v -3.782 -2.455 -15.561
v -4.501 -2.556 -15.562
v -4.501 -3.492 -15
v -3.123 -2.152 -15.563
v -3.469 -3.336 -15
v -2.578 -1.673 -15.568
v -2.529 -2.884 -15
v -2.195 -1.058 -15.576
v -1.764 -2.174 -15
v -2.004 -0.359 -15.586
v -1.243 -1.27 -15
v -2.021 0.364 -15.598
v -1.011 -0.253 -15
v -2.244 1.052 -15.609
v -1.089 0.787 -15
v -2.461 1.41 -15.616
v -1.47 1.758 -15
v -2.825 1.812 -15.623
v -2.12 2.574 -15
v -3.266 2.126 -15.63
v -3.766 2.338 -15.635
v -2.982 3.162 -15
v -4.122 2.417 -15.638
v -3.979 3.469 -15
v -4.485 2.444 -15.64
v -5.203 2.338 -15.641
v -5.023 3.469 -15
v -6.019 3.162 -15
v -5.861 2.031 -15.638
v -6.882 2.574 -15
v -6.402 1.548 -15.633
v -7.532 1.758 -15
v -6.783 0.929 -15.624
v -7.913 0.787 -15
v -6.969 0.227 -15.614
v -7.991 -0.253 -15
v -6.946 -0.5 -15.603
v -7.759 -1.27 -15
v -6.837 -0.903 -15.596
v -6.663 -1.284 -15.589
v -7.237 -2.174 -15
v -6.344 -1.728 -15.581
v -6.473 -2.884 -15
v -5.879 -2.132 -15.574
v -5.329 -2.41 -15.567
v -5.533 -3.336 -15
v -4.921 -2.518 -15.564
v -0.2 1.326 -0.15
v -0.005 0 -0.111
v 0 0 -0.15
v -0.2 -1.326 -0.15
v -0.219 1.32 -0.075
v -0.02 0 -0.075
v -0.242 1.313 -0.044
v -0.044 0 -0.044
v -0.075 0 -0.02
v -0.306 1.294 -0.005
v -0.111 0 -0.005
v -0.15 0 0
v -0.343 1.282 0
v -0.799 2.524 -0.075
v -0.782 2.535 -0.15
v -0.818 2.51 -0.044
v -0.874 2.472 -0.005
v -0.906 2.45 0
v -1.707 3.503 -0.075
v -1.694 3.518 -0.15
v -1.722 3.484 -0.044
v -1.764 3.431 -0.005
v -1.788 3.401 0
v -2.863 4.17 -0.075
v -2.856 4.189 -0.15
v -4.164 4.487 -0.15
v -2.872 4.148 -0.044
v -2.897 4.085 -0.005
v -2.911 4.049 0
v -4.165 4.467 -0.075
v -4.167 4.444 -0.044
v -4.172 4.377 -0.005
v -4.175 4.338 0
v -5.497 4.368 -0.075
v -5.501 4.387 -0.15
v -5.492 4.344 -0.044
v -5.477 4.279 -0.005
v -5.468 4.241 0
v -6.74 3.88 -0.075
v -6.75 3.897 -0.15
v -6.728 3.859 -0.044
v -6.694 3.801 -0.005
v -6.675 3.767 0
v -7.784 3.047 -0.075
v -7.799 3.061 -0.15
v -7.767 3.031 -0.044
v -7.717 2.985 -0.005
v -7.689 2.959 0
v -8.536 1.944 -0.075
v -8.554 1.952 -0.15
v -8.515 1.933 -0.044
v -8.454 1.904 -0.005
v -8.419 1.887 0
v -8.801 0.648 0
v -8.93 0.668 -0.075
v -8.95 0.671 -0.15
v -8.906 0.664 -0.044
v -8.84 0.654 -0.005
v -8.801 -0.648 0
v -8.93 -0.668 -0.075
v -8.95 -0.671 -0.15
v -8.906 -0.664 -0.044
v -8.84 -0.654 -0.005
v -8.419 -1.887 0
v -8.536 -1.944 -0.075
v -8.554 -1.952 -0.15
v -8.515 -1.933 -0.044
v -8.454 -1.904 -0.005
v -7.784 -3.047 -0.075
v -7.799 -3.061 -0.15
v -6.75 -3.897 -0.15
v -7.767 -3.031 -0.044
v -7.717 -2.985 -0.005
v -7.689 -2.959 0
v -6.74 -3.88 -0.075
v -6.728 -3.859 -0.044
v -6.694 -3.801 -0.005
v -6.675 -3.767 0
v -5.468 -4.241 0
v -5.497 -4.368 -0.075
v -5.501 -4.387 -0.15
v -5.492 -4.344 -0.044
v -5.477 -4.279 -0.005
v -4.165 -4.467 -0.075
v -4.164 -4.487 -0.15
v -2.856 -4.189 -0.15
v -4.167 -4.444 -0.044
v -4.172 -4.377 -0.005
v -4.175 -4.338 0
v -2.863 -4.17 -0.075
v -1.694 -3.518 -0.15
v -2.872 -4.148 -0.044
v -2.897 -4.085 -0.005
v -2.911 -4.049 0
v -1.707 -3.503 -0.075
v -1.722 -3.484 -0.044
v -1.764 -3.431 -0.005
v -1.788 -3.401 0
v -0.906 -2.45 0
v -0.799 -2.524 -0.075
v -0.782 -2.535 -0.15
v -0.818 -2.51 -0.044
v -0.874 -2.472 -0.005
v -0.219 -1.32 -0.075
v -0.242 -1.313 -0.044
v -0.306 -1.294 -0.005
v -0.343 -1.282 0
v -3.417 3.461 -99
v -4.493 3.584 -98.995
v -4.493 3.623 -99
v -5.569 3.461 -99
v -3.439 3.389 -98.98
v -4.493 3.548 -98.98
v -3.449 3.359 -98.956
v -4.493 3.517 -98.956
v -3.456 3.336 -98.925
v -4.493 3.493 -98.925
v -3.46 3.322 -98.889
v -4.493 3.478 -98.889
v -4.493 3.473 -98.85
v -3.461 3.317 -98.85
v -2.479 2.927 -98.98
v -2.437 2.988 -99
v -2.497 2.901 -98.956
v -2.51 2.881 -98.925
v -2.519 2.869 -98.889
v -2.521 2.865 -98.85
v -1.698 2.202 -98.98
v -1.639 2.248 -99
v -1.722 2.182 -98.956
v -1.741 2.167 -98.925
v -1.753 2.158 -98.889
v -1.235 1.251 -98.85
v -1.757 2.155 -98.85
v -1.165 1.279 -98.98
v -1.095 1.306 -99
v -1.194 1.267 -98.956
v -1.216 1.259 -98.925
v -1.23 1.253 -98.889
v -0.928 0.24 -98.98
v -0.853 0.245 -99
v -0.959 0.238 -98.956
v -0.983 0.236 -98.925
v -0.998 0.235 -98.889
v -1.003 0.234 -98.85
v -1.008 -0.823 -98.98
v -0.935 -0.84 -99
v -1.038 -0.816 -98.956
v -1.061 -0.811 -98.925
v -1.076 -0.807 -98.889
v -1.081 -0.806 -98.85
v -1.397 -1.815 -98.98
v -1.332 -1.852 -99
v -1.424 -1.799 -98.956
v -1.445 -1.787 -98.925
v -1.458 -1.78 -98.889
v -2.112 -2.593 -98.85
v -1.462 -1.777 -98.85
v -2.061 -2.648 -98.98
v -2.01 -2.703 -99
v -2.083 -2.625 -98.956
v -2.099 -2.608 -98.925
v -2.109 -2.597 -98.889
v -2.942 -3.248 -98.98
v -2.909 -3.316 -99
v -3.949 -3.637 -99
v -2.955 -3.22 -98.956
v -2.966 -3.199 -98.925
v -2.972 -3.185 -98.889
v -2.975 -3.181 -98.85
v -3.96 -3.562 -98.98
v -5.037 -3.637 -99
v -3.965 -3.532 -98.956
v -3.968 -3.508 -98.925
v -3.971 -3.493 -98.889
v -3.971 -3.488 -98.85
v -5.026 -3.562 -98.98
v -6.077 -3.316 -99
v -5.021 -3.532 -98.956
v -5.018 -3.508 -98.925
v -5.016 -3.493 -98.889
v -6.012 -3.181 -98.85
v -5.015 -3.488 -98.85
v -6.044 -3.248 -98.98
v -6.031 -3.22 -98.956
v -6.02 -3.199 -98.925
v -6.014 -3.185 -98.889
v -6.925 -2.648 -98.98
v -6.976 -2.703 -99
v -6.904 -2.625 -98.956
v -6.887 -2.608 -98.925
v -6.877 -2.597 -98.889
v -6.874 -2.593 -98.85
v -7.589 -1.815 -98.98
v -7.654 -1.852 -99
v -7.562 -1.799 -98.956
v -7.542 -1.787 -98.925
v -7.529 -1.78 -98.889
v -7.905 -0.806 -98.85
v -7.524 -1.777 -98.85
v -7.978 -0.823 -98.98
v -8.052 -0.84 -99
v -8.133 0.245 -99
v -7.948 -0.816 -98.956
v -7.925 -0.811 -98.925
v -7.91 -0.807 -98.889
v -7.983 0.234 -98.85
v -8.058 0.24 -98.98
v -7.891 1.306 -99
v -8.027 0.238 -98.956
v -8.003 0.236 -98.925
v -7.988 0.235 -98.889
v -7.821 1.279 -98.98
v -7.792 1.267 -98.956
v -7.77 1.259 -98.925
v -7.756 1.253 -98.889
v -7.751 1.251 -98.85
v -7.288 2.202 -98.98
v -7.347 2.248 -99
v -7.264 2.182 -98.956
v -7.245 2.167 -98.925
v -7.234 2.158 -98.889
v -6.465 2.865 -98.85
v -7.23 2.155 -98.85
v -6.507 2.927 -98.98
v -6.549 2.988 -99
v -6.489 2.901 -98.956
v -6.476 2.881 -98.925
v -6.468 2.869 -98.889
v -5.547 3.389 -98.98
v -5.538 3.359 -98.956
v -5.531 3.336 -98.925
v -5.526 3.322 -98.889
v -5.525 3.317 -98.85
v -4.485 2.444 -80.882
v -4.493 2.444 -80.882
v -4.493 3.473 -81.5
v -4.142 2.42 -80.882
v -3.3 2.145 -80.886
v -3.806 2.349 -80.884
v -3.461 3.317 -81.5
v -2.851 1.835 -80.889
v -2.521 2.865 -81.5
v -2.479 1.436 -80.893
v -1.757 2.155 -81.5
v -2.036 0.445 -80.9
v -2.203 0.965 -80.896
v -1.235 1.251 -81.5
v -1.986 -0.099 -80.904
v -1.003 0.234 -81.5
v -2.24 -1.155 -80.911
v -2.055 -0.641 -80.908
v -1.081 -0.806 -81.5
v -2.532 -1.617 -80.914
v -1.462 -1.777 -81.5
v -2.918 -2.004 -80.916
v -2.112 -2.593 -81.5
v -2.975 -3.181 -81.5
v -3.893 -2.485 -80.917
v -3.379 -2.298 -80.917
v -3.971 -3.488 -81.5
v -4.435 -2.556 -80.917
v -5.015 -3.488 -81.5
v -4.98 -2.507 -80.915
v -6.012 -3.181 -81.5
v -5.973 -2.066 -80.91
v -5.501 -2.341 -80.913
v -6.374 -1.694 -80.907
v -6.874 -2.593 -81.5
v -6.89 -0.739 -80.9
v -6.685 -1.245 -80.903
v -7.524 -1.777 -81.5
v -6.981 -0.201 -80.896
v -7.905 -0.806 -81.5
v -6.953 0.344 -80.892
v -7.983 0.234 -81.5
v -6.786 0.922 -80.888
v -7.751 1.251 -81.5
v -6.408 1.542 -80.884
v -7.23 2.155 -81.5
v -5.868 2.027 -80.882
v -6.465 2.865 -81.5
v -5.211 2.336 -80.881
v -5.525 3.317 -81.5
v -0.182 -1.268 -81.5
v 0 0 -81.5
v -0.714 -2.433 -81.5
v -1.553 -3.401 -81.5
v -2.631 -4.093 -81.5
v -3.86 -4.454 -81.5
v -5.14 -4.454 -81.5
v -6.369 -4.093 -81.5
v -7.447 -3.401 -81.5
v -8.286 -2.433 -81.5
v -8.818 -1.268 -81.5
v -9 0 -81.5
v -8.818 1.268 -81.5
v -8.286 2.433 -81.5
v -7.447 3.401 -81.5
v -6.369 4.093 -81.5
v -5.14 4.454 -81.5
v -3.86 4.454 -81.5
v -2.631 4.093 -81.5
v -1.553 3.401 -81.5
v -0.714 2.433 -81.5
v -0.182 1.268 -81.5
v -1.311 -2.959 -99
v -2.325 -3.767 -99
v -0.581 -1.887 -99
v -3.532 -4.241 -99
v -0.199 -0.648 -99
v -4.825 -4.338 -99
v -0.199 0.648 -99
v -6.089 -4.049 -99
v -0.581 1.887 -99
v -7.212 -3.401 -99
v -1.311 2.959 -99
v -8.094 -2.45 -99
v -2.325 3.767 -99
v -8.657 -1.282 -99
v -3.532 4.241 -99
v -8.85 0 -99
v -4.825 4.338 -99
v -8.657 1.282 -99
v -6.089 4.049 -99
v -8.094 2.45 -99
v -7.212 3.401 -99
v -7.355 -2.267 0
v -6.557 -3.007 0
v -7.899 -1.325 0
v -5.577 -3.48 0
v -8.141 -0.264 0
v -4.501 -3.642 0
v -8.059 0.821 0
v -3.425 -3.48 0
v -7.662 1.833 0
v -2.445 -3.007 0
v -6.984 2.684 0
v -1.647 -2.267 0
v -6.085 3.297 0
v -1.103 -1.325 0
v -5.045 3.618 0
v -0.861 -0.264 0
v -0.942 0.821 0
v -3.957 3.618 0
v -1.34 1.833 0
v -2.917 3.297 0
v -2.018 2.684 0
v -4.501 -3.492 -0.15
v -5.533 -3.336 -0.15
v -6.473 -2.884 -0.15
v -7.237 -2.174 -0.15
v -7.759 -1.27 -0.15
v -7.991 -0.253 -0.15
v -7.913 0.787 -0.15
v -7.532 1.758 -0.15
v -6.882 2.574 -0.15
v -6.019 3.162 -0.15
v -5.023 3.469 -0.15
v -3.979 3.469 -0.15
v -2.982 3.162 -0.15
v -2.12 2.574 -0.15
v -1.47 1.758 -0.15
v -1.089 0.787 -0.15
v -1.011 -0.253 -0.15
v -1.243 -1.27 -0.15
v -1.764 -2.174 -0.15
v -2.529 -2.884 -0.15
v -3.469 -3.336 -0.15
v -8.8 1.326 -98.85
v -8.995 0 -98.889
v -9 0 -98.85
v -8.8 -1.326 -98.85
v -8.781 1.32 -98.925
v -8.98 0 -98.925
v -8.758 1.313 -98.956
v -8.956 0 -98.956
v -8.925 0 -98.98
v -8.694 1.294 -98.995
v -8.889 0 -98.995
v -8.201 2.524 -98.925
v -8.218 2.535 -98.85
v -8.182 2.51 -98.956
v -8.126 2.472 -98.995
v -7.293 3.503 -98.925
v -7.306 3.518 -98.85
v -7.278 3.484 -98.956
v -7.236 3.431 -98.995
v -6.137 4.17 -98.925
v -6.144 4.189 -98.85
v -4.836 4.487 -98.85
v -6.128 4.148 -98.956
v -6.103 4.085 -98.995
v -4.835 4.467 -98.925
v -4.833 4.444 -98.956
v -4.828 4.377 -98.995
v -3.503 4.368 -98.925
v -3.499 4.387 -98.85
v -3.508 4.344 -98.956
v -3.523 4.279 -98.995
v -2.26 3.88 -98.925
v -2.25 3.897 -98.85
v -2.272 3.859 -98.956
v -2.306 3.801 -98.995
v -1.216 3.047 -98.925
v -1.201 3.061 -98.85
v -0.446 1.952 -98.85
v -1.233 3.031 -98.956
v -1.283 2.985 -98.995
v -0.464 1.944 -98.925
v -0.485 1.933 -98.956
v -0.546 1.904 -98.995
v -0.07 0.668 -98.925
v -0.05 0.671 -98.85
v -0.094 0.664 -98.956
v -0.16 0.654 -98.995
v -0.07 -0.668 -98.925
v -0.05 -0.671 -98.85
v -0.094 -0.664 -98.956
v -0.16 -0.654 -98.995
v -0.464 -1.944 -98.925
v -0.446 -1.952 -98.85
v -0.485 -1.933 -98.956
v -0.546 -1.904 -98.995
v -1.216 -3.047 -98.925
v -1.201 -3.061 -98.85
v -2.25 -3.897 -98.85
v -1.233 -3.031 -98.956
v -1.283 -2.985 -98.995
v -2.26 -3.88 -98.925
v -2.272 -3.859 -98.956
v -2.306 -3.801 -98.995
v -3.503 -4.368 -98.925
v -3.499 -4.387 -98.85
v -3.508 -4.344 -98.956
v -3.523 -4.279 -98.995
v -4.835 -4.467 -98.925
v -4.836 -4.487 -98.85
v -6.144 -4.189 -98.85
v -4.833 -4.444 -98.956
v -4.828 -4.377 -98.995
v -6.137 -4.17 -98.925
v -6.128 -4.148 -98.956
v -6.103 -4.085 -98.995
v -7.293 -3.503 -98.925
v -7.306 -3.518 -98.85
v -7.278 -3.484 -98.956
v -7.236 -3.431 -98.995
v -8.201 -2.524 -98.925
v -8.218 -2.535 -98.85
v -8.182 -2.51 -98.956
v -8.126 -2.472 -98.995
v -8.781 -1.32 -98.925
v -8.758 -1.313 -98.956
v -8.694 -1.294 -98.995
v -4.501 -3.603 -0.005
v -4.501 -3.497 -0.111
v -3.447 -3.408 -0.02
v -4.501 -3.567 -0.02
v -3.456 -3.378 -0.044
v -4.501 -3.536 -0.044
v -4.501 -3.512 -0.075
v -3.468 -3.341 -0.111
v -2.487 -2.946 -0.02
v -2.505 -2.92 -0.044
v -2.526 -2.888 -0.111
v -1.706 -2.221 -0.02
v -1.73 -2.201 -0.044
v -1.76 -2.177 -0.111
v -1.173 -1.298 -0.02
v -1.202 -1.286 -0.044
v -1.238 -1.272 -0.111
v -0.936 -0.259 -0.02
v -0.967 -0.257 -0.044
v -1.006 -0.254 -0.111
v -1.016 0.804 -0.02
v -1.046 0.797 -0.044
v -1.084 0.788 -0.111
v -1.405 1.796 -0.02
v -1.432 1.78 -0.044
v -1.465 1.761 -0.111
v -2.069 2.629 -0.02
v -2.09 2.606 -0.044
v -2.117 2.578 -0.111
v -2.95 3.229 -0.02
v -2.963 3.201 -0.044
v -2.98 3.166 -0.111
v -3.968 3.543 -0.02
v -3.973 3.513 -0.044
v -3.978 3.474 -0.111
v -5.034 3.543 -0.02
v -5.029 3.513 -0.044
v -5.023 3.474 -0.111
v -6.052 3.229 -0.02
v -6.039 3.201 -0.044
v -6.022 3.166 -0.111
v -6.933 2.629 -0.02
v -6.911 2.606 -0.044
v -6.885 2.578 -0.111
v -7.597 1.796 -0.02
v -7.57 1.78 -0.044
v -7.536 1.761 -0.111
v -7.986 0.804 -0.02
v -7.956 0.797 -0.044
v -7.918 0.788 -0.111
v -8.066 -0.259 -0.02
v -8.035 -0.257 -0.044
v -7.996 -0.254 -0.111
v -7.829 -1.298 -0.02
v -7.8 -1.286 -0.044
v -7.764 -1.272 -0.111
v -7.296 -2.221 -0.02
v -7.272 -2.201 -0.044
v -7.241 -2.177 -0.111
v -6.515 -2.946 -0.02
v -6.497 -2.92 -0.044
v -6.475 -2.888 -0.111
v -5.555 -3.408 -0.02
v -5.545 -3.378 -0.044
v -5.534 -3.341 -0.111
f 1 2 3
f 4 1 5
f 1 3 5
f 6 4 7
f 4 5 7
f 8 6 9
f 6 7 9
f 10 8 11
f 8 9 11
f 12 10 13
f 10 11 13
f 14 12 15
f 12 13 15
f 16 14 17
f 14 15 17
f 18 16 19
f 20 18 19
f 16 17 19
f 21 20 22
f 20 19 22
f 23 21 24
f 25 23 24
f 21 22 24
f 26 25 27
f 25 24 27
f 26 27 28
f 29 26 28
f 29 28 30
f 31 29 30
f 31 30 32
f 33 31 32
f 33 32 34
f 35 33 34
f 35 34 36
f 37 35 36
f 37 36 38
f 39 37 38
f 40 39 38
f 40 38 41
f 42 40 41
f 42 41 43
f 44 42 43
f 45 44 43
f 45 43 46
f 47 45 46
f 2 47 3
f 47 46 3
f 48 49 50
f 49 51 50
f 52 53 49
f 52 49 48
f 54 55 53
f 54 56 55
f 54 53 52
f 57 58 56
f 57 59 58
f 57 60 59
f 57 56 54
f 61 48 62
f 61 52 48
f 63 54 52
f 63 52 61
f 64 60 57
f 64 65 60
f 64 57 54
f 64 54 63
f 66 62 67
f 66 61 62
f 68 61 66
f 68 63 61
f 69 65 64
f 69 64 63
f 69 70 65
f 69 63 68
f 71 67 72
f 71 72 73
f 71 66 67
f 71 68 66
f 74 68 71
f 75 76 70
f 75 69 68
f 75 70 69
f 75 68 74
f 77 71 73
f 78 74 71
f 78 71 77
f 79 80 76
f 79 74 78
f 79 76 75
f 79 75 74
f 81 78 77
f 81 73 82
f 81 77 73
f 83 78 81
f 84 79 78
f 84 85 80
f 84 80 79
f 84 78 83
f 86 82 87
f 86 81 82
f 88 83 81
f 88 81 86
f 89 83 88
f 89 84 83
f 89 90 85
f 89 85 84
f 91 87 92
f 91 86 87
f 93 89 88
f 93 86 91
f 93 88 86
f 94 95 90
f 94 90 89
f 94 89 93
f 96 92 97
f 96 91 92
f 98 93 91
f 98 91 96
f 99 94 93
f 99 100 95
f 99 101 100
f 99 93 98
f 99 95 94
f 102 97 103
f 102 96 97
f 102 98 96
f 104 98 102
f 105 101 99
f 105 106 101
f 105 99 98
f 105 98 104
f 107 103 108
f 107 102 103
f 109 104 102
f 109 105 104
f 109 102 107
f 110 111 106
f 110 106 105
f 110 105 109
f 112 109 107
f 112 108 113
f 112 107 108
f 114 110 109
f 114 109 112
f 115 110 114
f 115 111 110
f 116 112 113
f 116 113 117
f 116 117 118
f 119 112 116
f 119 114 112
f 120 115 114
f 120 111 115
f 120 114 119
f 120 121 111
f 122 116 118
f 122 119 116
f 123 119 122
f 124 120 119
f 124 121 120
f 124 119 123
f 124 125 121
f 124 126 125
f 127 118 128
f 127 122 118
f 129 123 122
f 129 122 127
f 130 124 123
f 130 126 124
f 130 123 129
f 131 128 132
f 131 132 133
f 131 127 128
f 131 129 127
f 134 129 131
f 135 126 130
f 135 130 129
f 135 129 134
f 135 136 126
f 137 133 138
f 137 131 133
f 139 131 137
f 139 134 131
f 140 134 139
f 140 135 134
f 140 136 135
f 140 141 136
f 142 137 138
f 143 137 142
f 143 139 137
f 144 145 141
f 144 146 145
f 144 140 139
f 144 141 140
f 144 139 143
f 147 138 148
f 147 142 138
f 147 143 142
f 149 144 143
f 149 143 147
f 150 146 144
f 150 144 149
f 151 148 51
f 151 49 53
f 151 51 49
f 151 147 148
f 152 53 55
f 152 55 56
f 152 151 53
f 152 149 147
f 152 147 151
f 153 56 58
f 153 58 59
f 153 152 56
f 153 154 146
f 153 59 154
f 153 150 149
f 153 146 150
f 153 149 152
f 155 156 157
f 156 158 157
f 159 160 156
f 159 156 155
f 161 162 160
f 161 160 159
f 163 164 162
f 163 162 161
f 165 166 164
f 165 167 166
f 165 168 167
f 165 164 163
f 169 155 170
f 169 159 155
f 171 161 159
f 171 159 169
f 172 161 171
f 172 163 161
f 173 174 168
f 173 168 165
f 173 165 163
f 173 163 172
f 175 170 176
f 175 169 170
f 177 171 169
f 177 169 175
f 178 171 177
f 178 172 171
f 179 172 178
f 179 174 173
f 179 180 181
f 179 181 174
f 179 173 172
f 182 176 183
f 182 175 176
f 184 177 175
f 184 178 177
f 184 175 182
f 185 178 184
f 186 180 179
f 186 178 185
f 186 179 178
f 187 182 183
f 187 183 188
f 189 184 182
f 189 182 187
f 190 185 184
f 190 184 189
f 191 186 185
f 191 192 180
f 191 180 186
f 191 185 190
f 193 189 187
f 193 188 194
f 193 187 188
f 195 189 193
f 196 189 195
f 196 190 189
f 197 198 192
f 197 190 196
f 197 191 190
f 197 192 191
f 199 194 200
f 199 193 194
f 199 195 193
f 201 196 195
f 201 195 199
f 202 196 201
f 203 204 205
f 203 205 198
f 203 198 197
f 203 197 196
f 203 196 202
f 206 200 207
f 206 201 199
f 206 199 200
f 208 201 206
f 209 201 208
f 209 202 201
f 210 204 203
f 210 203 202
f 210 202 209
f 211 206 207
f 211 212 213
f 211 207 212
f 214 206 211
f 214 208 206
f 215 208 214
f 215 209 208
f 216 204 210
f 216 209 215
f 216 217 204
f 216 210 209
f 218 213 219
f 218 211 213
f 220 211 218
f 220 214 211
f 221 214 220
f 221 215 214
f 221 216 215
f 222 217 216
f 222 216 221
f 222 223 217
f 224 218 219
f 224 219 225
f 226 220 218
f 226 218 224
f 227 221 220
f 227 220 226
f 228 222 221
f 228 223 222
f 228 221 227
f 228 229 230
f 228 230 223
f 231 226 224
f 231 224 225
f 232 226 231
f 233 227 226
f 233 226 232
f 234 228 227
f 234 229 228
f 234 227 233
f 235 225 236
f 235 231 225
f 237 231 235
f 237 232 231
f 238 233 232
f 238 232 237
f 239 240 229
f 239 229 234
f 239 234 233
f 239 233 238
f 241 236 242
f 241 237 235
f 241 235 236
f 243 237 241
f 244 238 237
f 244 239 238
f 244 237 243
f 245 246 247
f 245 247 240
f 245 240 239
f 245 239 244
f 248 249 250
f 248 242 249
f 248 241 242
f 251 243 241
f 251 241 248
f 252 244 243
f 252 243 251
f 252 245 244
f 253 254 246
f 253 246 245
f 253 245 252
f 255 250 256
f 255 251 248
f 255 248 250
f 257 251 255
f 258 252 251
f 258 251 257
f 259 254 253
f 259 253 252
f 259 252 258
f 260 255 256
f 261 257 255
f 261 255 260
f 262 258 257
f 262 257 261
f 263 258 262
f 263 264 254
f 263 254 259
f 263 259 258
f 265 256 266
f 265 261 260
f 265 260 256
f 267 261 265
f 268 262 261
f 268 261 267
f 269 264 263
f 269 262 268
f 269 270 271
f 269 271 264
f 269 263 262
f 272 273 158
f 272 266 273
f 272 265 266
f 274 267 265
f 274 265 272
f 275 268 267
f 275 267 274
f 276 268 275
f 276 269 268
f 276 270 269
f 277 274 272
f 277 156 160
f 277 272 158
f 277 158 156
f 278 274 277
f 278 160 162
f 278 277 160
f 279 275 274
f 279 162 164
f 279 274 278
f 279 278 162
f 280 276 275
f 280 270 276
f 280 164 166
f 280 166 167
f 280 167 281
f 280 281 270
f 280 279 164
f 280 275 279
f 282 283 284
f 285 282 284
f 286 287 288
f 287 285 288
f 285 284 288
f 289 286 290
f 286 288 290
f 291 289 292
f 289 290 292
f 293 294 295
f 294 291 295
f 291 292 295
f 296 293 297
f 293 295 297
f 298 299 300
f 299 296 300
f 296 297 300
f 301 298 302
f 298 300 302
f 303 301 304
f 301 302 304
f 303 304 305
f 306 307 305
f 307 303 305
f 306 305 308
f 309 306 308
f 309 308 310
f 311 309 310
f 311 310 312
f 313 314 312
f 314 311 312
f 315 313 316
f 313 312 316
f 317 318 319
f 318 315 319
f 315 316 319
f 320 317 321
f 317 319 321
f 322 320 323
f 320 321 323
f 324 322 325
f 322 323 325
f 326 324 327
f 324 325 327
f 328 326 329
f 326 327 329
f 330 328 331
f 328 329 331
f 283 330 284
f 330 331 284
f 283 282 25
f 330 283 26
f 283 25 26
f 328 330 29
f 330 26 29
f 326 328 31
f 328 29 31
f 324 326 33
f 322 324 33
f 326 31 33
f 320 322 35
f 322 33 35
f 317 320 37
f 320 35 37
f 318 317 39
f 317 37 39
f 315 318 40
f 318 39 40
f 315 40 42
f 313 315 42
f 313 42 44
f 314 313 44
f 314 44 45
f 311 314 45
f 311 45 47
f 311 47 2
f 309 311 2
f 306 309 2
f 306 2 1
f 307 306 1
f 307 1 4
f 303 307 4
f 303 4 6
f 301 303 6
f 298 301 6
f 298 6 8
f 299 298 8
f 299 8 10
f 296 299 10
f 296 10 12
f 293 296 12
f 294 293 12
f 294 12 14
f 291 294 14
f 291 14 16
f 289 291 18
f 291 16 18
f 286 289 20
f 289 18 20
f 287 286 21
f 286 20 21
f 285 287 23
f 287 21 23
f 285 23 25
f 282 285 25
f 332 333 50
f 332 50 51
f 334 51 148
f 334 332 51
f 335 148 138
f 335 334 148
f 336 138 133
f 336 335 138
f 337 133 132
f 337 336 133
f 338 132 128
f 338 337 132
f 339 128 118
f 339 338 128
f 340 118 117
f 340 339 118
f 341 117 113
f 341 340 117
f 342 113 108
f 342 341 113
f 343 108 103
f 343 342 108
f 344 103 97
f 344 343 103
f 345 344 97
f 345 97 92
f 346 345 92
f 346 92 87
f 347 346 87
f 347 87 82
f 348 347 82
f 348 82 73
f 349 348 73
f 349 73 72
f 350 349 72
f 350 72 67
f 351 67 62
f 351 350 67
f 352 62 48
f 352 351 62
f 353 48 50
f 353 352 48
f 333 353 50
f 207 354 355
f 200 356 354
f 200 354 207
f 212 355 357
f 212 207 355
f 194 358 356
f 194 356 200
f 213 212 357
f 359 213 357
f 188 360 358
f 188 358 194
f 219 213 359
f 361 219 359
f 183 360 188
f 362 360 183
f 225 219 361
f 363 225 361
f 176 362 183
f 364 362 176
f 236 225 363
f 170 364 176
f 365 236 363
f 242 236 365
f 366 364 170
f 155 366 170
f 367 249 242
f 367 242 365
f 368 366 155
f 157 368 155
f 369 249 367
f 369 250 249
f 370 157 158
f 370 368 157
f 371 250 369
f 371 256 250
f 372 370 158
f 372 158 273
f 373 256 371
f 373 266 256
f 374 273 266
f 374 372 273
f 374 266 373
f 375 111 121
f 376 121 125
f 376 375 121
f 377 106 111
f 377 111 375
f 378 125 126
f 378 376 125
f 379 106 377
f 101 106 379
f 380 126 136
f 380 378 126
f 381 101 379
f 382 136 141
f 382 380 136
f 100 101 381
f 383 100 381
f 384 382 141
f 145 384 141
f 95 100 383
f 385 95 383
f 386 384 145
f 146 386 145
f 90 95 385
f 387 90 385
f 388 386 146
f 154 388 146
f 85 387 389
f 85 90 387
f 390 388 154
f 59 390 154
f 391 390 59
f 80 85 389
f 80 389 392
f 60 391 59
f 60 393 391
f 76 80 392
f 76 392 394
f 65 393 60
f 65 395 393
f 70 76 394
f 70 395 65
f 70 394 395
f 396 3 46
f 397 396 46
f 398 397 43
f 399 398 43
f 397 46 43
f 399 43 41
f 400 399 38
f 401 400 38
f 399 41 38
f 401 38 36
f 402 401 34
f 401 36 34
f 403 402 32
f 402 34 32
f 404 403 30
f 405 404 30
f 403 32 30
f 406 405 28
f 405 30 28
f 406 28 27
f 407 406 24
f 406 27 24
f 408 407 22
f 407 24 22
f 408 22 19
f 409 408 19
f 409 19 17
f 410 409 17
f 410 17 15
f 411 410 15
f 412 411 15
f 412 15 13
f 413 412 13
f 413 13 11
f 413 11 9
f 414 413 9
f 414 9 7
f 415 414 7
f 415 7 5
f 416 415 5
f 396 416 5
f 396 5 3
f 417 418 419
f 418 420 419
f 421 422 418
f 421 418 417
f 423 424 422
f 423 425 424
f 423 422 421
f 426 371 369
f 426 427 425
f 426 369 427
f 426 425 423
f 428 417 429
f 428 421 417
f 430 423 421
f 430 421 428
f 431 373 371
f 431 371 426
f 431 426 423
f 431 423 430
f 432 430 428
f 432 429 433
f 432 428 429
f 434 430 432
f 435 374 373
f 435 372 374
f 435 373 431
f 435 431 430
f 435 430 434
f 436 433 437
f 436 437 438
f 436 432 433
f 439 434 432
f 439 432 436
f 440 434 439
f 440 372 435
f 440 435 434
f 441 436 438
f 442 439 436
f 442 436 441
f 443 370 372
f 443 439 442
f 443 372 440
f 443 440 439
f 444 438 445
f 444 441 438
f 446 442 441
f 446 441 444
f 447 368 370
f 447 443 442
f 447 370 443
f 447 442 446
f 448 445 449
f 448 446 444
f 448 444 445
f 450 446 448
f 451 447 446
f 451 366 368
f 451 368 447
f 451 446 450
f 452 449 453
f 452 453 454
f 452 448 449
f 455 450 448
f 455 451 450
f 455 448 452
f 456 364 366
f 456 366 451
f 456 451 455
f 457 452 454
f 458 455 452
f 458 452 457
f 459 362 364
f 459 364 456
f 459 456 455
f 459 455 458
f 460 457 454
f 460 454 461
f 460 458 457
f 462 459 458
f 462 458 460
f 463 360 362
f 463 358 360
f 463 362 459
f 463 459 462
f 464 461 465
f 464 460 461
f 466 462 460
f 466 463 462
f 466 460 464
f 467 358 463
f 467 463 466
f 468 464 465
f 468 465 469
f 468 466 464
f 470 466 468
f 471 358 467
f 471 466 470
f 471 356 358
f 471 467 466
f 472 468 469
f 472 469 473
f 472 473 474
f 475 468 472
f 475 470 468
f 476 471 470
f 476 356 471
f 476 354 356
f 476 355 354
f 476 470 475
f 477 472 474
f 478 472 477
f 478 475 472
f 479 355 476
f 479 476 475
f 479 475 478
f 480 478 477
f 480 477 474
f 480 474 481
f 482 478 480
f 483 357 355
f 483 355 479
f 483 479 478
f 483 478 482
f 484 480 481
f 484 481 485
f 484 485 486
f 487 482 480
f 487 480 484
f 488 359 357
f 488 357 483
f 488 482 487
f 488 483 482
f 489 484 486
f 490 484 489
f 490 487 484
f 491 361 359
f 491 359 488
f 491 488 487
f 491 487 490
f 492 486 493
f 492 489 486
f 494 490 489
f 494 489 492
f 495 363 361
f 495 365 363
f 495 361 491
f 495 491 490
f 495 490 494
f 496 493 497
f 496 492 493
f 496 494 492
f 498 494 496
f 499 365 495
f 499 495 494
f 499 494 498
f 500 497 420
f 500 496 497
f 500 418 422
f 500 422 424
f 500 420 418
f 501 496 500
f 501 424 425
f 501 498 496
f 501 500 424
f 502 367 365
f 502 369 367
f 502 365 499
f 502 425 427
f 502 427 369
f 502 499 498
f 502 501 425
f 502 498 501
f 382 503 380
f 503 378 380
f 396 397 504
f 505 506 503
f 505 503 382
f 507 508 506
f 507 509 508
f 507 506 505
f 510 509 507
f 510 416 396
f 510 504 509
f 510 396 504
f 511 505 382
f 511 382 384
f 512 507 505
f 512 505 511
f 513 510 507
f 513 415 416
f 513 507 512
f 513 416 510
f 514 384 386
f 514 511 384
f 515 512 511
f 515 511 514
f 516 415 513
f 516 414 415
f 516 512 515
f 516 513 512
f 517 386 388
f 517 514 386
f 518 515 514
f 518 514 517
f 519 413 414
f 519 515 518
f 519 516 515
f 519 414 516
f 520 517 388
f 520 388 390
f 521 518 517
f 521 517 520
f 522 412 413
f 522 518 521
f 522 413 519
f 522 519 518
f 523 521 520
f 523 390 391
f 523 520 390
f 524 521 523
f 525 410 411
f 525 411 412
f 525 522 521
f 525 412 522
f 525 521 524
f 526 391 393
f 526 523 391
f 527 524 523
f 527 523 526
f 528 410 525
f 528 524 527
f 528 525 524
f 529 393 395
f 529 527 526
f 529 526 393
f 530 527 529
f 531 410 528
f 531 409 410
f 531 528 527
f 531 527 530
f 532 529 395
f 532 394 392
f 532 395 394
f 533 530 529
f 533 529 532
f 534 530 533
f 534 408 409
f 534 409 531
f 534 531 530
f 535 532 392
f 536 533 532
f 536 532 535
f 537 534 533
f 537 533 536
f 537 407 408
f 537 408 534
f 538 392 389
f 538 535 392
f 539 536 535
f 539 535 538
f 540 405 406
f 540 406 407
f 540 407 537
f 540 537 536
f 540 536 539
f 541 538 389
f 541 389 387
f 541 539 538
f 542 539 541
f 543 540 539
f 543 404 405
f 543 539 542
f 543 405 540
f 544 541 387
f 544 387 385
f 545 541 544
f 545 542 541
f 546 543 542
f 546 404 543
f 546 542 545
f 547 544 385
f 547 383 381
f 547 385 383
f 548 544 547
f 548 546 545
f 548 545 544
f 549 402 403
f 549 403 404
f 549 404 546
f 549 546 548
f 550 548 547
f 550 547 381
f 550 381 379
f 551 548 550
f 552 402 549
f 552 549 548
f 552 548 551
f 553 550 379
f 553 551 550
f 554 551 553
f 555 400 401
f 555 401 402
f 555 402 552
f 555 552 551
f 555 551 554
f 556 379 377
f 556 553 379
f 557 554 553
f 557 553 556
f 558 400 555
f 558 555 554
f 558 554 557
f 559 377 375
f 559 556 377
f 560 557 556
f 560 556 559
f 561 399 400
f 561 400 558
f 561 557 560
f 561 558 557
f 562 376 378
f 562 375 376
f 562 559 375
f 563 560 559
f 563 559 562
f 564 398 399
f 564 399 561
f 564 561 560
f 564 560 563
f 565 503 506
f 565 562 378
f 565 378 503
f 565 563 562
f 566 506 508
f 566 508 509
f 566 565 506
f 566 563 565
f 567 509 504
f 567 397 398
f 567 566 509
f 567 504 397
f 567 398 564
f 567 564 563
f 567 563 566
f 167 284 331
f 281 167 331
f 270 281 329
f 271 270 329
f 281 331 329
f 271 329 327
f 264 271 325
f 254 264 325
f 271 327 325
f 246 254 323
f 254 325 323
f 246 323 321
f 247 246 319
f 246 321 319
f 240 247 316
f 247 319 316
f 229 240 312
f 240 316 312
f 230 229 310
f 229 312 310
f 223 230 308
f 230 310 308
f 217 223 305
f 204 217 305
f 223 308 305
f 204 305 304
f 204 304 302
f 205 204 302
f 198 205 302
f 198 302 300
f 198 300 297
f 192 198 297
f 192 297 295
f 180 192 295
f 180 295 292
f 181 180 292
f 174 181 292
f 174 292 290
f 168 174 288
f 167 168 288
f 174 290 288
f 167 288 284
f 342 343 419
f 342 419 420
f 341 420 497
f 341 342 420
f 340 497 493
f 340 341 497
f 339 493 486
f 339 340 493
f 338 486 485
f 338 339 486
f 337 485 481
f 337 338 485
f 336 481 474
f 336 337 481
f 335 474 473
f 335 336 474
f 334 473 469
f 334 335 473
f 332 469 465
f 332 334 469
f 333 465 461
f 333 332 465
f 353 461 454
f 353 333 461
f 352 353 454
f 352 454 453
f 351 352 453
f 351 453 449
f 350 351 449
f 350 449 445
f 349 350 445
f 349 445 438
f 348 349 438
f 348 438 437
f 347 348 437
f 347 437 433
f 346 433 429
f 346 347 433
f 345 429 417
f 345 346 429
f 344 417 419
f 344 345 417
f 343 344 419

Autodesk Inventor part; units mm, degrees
ref_plane "YZ Plane" through (0, 0, 0) normal (1, 0, 0) x (0, 1, 0)
ref_plane "XZ Plane" through (0, 0, 0) normal (0, 1, 0) x (-1, 0, 0)
ref_plane "XY Plane" through (0, 0, 0) normal (0, 0, 1) x (1, 0, 0)
sketch "草圖1" plane through (0, 0, 0) normal (0, 1, 0) x (-1, 0, 0)
  line L0 (0, 0) -> (0, -99)
  line L1 (0, -99) -> (4.5, -99)
  line L2 (4.5, -99) -> (4.5, 0)
  line L3 (4.5, 0) -> (0, 0)
  line L4 (0, -99) -> (0, -81.5)
  line L5 (0, -81.5) -> (4.5, -81.5)
  dimension "d0" = 99
  dimension "d1" = 4.5
  dimension "d2" = 90
  dimension "d4" = 17.5
revolve "迴轉3" add sketch "草圖1" angle 360 about axis through (-4.5, 0, -99) along (0, 0, 1) contours L3 L2 L5 L0
sketch "草圖3" plane through (-4.5, 0, -81.5) normal (0, 0, -1) x (-1, 0, 0)
  point P0 (-4.5, 0)
  point P1 (-0.0147, -0.0564)
hole "孔2" at (-4.4853, -0.0564, -81.5) direction (0, 0, 1) diameter 5 depth 66.5 tip angle 118
sketch "草圖4" plane through (-4.5, 0, 0) normal (0, 0, 1) x (1, 0, 0)
  point P0 (4.5, 0)
  point P1 (-0.0009, 0.0083)
hole "孔3" at (-4.5009, 0.0083, 0) direction (0, 0, -1) diameter 7 depth 15 tip angle 118
sketch "草圖5" plane through (-4.5, 0, -81.5) normal (0, 0, -1) x (-1, 0, 0)
  circle A0 centre (0, 0) radius 4.5
  point P0 (-4.5, 0)
extrude "擠出1" add sketch "草圖5" along normal blind 17.5
sketch "草圖6" plane through (-4.5, 0, -99) normal (0, 0, -1) x (-1, 0, 0)
  point P0 (-4.5, 0)
  point P1 (-0.0069, -0.0273)
hole "孔4" at (-4.4931, -0.0273, -99) direction (0, 0, 1) diameter 7 depth 17.5 tip angle 118
fillet "圓角1" radius 0.15 1 edges at (-9, 0, 0)
fillet "圓角2" radius 0.15 3 edges at (-4.5009, 3.5083, 0) (-4.4931, -3.5273, -99) (0, 0, -99)
properties part number "筆桿"
